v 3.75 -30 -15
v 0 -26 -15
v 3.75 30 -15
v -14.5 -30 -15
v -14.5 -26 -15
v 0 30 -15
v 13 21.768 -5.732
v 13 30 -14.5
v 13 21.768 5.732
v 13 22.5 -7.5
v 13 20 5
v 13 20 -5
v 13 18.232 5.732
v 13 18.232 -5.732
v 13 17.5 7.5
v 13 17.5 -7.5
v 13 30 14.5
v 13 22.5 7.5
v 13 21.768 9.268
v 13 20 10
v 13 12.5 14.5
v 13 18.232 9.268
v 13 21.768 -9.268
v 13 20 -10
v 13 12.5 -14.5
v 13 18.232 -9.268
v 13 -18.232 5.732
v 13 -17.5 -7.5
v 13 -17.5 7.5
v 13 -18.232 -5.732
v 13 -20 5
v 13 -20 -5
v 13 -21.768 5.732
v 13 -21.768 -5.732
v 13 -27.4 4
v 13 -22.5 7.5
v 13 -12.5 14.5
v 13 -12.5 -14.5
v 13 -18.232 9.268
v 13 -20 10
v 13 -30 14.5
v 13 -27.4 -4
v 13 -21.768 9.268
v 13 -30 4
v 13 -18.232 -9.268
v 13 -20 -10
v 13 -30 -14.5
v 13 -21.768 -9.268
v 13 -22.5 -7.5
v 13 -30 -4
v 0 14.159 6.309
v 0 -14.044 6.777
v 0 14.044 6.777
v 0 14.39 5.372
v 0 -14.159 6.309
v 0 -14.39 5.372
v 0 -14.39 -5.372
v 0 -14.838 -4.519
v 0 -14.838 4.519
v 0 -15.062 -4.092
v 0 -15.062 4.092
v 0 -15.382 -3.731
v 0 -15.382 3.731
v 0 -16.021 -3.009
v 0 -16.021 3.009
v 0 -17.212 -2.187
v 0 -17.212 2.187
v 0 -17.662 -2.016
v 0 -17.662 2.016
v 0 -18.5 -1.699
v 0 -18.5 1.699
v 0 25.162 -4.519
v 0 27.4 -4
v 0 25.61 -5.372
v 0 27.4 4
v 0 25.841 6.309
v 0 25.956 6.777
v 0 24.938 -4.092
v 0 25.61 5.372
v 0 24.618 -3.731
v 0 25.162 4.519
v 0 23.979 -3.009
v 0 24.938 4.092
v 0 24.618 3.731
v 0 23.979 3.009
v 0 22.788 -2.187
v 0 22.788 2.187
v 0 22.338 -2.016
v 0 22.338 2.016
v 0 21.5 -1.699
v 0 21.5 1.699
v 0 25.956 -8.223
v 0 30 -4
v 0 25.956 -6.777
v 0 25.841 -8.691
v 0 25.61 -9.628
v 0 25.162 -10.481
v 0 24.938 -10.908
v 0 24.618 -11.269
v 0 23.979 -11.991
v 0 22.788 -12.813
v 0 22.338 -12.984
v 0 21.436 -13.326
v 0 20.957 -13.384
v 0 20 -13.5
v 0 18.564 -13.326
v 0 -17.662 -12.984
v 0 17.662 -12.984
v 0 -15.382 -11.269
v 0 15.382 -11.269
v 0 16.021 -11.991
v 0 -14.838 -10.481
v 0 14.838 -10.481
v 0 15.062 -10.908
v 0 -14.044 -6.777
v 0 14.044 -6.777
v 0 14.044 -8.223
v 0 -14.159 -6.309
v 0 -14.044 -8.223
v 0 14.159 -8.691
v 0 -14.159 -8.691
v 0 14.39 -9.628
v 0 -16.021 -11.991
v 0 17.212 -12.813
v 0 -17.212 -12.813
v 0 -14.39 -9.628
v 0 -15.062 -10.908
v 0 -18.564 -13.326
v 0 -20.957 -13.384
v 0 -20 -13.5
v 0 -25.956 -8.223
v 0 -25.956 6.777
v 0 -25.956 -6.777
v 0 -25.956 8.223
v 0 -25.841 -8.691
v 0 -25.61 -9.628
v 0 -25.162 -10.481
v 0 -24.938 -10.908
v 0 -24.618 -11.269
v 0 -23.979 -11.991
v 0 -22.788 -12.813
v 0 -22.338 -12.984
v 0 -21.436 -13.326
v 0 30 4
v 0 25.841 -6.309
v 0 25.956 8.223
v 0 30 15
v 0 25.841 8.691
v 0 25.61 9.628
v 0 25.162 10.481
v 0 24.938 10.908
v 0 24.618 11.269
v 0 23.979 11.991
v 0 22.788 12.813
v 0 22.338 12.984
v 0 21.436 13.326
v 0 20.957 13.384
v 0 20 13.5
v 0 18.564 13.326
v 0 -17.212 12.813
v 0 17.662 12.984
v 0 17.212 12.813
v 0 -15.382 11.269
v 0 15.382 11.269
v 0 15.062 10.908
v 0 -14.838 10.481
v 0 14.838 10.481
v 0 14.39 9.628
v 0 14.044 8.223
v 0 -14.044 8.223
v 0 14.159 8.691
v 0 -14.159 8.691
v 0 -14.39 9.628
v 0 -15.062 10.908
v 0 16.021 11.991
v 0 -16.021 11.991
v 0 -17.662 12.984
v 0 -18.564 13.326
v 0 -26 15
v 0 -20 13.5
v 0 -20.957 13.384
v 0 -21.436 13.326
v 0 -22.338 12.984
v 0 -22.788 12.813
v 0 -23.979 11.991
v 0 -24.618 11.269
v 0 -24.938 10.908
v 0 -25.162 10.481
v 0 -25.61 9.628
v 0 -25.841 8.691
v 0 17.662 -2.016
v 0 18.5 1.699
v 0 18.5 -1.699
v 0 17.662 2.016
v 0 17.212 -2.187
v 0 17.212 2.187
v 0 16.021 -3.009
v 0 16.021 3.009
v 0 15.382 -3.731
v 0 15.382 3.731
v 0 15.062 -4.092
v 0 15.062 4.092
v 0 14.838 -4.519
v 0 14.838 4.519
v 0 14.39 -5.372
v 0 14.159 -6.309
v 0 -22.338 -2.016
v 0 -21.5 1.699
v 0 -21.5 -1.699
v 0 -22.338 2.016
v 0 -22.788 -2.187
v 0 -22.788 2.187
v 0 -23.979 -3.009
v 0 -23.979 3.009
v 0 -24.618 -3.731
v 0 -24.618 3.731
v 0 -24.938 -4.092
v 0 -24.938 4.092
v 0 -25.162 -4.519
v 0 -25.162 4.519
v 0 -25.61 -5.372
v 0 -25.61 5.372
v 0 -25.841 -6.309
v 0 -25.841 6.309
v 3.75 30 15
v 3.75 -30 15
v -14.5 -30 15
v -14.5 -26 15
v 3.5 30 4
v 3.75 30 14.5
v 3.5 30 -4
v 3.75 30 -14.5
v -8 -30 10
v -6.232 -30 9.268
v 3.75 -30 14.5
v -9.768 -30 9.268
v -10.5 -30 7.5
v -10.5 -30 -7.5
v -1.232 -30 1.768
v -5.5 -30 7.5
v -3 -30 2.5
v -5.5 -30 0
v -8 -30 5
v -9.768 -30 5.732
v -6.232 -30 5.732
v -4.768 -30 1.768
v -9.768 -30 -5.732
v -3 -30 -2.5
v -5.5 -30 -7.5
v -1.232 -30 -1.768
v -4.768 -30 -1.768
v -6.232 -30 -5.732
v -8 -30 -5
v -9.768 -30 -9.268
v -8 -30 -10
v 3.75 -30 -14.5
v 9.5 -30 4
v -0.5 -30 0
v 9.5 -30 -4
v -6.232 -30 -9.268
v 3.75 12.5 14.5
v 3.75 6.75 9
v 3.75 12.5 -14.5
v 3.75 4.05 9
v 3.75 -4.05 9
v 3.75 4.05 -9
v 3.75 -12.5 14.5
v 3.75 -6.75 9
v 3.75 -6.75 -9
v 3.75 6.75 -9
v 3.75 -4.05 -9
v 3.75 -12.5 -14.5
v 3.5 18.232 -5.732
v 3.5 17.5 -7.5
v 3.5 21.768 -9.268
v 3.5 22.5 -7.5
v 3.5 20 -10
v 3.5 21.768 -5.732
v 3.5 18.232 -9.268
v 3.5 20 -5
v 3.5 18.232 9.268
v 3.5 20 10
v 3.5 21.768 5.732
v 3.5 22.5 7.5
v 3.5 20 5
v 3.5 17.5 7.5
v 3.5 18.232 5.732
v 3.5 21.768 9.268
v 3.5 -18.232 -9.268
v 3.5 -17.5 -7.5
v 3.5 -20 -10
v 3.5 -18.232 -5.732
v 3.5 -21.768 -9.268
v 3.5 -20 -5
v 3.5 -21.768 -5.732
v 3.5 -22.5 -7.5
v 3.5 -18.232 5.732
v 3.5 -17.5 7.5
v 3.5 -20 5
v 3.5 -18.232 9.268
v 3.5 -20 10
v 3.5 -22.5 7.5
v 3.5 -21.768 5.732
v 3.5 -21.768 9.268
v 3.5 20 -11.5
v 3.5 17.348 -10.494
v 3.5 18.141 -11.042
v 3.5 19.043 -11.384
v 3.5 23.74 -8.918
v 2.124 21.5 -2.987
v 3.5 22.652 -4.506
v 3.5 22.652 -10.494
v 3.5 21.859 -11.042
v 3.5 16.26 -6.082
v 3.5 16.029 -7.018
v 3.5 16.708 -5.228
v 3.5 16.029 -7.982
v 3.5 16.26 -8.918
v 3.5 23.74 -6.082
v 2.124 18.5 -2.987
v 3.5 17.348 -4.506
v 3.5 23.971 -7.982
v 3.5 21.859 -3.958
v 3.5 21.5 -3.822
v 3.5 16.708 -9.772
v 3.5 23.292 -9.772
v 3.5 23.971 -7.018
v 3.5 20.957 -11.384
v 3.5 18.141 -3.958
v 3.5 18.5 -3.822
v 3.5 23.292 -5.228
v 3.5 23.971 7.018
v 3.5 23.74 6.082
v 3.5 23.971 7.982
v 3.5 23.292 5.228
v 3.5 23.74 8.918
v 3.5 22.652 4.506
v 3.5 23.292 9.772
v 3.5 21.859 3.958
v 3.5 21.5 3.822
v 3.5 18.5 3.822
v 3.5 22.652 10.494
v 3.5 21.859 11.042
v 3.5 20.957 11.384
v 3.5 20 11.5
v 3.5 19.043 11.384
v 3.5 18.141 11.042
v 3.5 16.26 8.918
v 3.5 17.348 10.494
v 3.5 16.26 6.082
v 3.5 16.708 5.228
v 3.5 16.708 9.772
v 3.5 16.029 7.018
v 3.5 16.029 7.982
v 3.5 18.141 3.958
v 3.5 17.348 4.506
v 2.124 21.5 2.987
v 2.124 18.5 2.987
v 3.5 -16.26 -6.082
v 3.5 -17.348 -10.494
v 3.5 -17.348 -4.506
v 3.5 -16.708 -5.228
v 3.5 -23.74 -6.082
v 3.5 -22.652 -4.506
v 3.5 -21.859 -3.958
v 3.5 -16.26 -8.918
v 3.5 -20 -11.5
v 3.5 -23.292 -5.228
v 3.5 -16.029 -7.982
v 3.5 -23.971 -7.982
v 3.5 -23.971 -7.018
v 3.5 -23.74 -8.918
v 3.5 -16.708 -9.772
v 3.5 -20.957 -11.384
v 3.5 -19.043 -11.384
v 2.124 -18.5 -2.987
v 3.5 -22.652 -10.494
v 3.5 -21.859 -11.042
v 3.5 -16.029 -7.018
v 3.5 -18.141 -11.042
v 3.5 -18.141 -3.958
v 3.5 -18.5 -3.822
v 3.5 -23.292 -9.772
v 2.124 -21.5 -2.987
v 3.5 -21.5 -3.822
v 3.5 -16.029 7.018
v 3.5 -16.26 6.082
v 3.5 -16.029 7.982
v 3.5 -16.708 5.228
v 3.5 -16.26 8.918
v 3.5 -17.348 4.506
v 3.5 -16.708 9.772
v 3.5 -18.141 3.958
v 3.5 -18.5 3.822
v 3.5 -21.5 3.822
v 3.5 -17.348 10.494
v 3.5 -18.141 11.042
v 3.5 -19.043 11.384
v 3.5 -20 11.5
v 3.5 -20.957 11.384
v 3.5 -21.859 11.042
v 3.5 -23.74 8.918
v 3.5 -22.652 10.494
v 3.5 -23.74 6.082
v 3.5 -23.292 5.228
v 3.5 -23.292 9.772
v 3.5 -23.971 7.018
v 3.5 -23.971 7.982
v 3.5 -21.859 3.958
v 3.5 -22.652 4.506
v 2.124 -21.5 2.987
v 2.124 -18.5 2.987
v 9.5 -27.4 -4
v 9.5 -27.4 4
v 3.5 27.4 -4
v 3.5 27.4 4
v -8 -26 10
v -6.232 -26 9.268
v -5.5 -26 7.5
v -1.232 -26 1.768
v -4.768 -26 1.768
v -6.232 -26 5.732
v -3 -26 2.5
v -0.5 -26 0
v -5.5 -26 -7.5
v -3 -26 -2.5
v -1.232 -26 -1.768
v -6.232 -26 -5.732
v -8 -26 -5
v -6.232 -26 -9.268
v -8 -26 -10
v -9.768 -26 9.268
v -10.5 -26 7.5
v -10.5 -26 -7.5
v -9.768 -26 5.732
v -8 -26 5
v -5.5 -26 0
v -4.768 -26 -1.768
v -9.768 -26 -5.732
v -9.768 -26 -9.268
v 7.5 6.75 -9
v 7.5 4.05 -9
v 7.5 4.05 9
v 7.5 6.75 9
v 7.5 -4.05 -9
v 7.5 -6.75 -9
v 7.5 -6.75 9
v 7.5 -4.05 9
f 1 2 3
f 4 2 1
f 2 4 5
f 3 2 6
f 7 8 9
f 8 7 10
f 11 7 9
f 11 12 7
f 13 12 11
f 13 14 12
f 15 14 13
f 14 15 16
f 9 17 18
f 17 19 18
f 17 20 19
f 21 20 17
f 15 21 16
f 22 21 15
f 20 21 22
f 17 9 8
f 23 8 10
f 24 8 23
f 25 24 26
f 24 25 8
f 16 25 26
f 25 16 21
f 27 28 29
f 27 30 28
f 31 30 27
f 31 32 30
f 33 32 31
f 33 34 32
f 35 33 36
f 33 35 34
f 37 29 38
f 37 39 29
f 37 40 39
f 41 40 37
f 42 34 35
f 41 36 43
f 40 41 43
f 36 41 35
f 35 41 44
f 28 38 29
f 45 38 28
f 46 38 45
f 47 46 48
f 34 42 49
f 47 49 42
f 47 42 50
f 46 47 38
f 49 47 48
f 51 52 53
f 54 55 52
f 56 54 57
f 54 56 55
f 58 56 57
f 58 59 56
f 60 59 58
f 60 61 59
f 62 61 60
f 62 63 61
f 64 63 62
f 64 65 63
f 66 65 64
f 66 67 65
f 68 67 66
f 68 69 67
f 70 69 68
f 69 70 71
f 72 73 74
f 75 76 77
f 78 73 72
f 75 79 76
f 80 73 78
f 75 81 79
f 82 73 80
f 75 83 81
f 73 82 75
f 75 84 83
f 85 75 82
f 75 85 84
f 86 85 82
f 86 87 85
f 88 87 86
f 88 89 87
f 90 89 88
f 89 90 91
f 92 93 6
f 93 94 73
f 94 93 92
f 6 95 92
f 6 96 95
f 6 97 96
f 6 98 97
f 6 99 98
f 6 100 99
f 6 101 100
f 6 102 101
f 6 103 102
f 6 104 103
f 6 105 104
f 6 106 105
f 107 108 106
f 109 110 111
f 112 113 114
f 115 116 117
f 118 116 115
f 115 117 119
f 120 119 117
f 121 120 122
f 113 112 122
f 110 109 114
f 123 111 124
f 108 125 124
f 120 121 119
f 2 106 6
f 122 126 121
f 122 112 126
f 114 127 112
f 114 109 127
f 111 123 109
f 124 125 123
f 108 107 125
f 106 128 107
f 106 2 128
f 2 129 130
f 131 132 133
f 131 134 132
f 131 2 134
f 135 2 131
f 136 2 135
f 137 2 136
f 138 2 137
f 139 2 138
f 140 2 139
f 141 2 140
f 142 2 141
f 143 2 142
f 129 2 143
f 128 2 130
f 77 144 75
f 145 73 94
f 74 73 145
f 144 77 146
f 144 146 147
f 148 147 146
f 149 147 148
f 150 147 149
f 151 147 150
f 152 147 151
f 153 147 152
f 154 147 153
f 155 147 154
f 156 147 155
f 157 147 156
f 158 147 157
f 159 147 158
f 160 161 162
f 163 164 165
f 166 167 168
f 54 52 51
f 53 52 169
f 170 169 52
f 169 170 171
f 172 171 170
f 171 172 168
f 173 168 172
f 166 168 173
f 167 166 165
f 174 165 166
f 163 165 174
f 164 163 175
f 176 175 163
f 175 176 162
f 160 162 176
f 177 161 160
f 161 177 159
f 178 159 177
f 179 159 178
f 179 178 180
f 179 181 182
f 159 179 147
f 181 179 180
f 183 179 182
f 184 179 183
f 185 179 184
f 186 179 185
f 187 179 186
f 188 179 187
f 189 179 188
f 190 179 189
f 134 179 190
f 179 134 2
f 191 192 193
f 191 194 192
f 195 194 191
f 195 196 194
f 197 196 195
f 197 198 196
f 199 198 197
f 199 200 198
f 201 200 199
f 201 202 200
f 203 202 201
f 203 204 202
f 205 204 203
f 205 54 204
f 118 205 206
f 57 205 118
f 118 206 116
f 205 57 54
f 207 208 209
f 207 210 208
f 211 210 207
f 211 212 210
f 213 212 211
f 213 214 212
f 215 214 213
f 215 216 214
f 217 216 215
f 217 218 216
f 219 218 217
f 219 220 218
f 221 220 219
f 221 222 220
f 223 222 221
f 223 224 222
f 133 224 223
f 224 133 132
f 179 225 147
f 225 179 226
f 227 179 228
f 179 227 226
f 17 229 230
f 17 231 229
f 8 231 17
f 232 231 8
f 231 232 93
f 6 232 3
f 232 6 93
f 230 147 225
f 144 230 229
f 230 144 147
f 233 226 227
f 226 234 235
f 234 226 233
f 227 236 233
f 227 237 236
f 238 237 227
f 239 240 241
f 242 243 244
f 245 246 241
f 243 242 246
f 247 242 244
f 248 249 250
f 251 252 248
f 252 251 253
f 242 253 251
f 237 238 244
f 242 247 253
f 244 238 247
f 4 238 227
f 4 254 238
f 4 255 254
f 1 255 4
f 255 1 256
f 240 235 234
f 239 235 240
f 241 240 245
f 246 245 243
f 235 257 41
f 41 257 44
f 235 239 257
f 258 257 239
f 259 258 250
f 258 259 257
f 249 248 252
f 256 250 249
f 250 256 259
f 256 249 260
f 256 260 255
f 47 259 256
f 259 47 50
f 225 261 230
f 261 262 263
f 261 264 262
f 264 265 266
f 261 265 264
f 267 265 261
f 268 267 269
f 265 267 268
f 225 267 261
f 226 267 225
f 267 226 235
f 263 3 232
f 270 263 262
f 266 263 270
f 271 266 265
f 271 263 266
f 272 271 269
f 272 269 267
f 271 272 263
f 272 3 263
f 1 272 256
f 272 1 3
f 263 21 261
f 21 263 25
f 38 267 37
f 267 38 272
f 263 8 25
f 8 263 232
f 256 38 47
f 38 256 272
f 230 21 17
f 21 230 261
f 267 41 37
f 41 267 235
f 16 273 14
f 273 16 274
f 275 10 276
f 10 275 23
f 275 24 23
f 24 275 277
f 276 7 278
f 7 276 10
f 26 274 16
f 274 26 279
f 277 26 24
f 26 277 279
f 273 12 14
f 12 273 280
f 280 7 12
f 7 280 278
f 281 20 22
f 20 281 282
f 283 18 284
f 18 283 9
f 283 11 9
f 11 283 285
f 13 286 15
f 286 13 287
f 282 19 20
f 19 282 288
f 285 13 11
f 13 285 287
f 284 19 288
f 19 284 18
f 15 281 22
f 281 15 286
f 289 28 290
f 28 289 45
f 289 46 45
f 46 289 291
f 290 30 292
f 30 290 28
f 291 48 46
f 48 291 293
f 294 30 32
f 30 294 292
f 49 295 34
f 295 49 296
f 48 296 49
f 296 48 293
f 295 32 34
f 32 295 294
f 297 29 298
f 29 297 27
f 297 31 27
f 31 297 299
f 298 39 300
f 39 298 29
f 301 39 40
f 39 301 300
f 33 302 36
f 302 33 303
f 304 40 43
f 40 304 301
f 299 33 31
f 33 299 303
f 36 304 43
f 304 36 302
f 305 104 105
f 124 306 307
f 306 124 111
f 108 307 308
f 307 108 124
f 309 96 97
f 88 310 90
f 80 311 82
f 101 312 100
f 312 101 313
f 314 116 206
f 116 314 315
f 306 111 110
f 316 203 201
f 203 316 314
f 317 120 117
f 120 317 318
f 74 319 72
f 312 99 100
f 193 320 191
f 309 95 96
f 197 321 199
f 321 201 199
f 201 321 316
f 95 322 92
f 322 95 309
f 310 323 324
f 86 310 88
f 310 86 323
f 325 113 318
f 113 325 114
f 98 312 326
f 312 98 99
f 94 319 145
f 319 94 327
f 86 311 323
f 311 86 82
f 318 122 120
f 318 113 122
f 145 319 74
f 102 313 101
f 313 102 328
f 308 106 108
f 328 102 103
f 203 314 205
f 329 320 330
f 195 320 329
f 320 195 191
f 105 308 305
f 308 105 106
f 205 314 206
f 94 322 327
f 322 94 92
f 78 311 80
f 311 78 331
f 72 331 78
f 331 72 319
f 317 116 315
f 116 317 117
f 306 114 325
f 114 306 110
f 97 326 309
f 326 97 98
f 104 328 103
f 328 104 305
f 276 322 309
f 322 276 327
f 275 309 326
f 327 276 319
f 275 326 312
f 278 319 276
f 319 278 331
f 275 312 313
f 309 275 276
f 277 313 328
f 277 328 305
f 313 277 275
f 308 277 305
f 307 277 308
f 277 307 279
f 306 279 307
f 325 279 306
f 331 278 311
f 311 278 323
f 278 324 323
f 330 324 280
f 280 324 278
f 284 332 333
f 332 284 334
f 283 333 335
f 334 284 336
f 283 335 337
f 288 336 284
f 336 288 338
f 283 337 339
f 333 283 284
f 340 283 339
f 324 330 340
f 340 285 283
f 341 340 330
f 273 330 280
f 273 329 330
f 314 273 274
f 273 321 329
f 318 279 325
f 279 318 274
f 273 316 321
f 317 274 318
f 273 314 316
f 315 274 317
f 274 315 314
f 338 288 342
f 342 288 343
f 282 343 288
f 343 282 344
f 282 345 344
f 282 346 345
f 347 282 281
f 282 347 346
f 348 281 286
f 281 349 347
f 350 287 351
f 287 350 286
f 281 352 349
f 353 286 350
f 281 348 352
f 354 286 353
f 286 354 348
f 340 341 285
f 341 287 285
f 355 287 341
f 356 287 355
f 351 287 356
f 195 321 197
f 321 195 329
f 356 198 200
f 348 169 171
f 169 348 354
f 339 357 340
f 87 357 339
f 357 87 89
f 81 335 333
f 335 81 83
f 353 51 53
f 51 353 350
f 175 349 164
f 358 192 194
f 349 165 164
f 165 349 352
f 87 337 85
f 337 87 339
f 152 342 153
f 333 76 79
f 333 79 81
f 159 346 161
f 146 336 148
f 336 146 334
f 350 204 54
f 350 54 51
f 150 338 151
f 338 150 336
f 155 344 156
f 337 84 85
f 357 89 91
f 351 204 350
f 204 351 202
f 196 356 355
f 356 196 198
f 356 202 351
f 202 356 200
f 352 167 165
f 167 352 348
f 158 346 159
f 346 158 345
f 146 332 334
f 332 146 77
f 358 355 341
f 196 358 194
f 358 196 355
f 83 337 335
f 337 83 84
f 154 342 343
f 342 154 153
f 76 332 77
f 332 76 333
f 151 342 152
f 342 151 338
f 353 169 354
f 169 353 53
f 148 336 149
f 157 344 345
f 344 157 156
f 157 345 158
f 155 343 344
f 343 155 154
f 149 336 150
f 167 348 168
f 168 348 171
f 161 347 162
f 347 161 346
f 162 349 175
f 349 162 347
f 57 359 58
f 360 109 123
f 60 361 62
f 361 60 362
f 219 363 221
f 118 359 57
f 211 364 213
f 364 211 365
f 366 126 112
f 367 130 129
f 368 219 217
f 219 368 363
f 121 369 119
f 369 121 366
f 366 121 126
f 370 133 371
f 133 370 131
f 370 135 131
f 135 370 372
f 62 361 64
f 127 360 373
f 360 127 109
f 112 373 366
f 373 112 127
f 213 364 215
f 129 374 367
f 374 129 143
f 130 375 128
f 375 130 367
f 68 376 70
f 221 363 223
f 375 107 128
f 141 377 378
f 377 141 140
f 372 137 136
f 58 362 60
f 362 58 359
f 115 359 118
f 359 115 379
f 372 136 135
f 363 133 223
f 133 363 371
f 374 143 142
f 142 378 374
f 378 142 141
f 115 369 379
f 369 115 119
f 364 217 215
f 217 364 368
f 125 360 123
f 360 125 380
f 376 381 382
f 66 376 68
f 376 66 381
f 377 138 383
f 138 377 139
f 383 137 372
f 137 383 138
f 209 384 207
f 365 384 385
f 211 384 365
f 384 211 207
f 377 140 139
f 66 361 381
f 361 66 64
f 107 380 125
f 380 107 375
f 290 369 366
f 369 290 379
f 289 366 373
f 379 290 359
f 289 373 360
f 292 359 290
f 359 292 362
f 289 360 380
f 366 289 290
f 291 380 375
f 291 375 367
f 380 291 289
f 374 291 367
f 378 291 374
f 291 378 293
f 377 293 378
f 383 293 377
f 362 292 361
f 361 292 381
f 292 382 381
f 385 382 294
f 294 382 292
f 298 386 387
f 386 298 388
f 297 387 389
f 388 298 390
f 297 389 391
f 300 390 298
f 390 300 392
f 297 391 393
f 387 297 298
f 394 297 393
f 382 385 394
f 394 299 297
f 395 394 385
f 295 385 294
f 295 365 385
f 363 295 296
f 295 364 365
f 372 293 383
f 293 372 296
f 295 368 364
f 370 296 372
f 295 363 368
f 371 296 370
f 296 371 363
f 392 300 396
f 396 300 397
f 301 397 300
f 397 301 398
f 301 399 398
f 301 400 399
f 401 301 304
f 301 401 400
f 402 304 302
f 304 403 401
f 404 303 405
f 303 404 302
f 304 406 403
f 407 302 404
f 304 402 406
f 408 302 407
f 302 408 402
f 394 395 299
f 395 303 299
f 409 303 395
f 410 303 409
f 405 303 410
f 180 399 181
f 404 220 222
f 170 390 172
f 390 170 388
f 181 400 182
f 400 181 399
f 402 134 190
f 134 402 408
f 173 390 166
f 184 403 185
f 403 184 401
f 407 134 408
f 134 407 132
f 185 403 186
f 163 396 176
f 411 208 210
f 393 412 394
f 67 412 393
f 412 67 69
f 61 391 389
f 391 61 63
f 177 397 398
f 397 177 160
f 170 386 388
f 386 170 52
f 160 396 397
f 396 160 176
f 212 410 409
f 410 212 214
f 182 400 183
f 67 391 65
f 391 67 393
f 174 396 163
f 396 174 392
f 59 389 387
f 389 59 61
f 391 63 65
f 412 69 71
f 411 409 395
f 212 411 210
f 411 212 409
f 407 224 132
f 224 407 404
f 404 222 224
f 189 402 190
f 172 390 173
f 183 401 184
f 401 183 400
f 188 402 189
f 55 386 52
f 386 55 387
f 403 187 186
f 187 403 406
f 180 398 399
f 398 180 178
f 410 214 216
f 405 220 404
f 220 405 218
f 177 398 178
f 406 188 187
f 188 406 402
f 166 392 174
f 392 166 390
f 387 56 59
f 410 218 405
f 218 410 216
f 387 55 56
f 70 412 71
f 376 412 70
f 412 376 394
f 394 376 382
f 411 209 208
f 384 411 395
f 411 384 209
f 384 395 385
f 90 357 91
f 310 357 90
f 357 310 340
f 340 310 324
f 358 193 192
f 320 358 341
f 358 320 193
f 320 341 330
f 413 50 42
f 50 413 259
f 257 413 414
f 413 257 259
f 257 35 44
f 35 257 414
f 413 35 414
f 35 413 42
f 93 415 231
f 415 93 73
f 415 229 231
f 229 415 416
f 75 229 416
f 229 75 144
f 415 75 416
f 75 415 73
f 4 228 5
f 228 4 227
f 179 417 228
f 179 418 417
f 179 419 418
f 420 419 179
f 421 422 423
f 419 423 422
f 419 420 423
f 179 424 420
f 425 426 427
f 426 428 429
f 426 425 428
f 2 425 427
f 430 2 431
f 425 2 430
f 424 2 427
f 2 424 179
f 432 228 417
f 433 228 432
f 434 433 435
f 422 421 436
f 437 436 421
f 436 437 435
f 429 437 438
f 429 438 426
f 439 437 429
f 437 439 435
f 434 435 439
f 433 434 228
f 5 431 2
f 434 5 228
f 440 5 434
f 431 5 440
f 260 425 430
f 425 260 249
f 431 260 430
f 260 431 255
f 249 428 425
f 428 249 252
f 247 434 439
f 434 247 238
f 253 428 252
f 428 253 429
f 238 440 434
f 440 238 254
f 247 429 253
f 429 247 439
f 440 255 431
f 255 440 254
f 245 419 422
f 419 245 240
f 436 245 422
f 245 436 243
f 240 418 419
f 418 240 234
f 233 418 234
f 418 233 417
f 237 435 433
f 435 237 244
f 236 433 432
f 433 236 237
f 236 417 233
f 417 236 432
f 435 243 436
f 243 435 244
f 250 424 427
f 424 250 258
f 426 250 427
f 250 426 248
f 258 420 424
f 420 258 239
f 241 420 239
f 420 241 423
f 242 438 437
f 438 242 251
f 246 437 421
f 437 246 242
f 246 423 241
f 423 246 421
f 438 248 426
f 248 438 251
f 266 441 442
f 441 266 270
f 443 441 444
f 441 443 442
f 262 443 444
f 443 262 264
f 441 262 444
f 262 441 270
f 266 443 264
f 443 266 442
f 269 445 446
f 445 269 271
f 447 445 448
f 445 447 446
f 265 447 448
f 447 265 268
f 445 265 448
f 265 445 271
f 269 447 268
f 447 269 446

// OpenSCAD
//block shape
x=30;
y=60;
z=13;

// track channel
f=x+10;
g=25;
h=9.5;
// block top
e=20;
r=y+10;
t=16.5;

// spacing of screw holes
cx=15;
cy=40;
dx=15;
dy=45;

// rotation
gx=90;

rotate([0,gx,0])
difference()
{
    translate([0,0,z]/2) cube ([x,y,z],center=true);
    translate([0,0,z+4]/2) cube([f,g,h],center=true);
    translate([49,0,z+11]/2) cube ([e,r,t],center=true);
        translate([-49,0,z+11]/2) cube ([e,r,t],center=true);

  translate([cx,cy,0]/2) cylinder(d=5, h=50,  center=true);
  translate([-cx,cy,0]/2) cylinder(d=5, h=50,  center=true);
    translate([cx,-cy,0]/2) cylinder(d=5, h=50,  center=true);
    translate([-cx,-cy,0]/2) cylinder(d=5, h=50,  center=true);
  translate([dy,dy,0]/2) cylinder(d=5, h=50,  center=true);
  translate([-dy,dy,0]/2) cylinder(d=5, h=50,  center=true);
    translate([dy,-dy,0]/2) cylinder(d=5, h=50,  center=true);
    translate([-dy,-dy,0]/2) cylinder(d=5, h=50,  center=true);  
    translate([dy,dx,0]/2) cylinder(d=5, h=50,  center=true);
  translate([-dy,dx,0]/2) cylinder(d=5, h=50,  center=true);  
  translate([dy,-dx,0]/2) cylinder(d=5, h=50,  center=true);
  translate([-dy,-dx,0]/2) cylinder(d=5, h=50,  center=true);  
    
 translate([cx,cy,0]/2)  cylinder(d1=16, d2=8, h=7,  center=true);
 translate([-cx,cy,0]/2) cylinder(d1=16, d2=8, h=7, center=true);
    translate([cx,-cy,0]/2) cylinder(d1=16, d2=8, h=7,  center=true);
    translate([-cx,-cy,0]/2) cylinder(d1=16, d2=8, h=7,  center=true);    
// zip tie knotches    
    translate([0,-cy/2,11.5-10]) cube([18,3,4],center=true);
    translate([0,cy/2,11.5-10]) cube([18,3,4],center=true);
// removal knotches
       translate([0,-(6.8+51)/2,11.5]) cube([8,3,4],center=true);
   translate([0,(6.8+51)/2,11.5-10]) cube([8,3,4],center=true);
   translate([(6.8+51)/2,0,11.5-11]) cube([3,8,2],center=true);
   translate([-(6.8+51)/2,0,11.5-11]) cube([3,8,2],center=true);
}

rotate([0,gx,0])
difference ()
{
    translate([0,-28,-7]) cube([30,4,15],center=true);
    translate([7.5,-28,-8])rotate([90,0,0]) cylinder(d=5, h=60, center=true);
      translate([-7.5,-28,-8])rotate([90,0,0]) cylinder(d=5, h=60, center=true);
      translate([0,-28,-3])rotate([90,0,0]) cylinder(d=5, h=60, center=true);
}
rotate([0,gx,0])
translate([0,(6.8+4)/2,z-8]) cube([18,2.7,5],center=true);
rotate([0,gx,0])
translate([0,-(6.8+4)/2,z-8]) cube([18,2.7,5],center=true);
